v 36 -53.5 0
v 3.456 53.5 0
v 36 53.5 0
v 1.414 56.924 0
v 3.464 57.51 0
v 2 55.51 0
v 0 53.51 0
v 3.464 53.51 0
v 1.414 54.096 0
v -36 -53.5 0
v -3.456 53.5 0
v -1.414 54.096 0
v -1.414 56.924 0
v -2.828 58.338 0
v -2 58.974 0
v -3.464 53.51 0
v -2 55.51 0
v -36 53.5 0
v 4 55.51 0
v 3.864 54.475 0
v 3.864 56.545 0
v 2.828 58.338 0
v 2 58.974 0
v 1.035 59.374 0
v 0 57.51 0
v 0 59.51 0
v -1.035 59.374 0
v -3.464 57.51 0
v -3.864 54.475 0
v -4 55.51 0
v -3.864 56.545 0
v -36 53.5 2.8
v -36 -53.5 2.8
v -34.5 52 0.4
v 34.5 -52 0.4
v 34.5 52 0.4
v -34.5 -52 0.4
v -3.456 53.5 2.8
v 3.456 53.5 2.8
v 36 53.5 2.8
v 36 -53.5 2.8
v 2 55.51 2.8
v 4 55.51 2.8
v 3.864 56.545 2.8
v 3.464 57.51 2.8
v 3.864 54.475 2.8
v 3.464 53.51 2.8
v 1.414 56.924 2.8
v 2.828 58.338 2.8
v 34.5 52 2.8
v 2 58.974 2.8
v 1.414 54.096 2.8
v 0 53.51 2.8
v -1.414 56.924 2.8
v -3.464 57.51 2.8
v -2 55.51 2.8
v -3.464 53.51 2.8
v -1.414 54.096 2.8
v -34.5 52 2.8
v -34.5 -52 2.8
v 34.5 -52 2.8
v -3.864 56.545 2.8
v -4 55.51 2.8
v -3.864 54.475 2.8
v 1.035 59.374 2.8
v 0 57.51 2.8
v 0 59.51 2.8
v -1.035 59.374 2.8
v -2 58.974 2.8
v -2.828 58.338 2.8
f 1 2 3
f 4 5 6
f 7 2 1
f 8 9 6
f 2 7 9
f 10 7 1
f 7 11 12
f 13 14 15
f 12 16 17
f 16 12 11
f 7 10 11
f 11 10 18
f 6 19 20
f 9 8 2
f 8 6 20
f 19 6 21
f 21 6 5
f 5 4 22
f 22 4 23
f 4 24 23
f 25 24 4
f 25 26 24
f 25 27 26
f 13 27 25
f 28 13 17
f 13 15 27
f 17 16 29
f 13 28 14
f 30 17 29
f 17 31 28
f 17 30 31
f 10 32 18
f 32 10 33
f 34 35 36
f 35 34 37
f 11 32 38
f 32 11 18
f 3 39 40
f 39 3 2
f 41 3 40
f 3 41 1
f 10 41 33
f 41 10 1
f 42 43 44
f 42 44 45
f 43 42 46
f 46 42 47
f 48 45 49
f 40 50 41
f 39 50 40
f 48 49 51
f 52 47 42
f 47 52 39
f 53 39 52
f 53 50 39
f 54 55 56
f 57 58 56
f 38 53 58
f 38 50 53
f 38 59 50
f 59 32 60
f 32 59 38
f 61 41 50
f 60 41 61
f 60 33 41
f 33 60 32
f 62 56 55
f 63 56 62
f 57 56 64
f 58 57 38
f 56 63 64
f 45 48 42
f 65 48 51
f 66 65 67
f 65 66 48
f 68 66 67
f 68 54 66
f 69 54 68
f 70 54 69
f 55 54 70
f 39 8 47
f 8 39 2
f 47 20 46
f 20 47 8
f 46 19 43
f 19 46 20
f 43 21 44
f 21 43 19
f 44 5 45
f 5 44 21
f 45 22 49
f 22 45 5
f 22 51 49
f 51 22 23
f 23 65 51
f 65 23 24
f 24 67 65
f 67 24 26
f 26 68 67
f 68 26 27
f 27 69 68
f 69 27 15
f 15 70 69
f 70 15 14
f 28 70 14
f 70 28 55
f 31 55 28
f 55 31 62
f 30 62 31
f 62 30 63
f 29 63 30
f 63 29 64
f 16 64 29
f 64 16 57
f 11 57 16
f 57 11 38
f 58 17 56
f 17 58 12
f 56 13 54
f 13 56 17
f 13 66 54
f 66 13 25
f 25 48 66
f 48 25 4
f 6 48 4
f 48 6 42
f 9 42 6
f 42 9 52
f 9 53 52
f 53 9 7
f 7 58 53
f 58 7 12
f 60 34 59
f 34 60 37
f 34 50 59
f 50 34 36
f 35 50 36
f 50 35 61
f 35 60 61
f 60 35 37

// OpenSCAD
/* 
 * Based on Customizable Lithopane http://www.thingiverse.com/thing:74322
 * 
 * Added ability to remove hook hole and specify border sizes
 * Fixed X/Y size to match surface() returned size and added smidgen to difference.
 *
 */

// preview[view:south, tilt:top]

/* [Image] */

// Load a 70x105 pixel image.(images will be stretched to fit) Simple photos work best. Don't forget to click the Invert Colors checkbox!
image_file = "image-surface4x6.dat"; // [image_surface:70x105]

/* [Adjustments] */
// Set both hole values to zero for no hole
hole_diameter = 4;
hole_border = 2;
// Zero for no border
lithophane_border = 3;
// What layer height will you slice this at?  The thinner the better.
layer_height = 0.2;

// The lower the layer height, the more layers you can use.
number_of_layers = 12; // [5:20]

/* [Hidden] */
s=0.01;
length = 69; // surface() produces a n-1 object
width = 104;  // bug in surface drops last line

// base (white) will always be 2 layers thick
min_layer_height = layer_height*2;
hole_radius = hole_diameter/2;
height = layer_height*number_of_layers;
height_borderless=height/2;
union() {
	
  // take just the part of surface we want
  difference() {
    translate([0, 0, min_layer_height]) scale([1,1,height]) surface(file=image_file, center=true, convexity=5);
	// -
    translate([0,0,-(height+min_layer_height)]) linear_extrude(height=height+min_layer_height) square([length+s, width+s], center=true);
  } // d
  linear_extrude(height=layer_height*2) square([length+lithophane_border, width+lithophane_border], center=true);
  
//render()
  linear_extrude(height=( (lithophane_border>0) ? height+min_layer_height : height_borderless+min_layer_height)){
	  difference(){
		
		union(){
	      square([length+lithophane_border, width+lithophane_border], center=true);
		  translate([0, width/2+hole_radius+lithophane_border/2+s, 0])
		    circle(r=hole_radius+ hole_border,$fn=24);
		} // u
		// -
		
	    union(){
	      square([length, width], center=true);
		  translate([0, width/2+hole_radius+lithophane_border/2+s, 0])
	        circle(r=hole_radius,$fn=8);
	    } // u
	  } // d
  } // le
} // u
